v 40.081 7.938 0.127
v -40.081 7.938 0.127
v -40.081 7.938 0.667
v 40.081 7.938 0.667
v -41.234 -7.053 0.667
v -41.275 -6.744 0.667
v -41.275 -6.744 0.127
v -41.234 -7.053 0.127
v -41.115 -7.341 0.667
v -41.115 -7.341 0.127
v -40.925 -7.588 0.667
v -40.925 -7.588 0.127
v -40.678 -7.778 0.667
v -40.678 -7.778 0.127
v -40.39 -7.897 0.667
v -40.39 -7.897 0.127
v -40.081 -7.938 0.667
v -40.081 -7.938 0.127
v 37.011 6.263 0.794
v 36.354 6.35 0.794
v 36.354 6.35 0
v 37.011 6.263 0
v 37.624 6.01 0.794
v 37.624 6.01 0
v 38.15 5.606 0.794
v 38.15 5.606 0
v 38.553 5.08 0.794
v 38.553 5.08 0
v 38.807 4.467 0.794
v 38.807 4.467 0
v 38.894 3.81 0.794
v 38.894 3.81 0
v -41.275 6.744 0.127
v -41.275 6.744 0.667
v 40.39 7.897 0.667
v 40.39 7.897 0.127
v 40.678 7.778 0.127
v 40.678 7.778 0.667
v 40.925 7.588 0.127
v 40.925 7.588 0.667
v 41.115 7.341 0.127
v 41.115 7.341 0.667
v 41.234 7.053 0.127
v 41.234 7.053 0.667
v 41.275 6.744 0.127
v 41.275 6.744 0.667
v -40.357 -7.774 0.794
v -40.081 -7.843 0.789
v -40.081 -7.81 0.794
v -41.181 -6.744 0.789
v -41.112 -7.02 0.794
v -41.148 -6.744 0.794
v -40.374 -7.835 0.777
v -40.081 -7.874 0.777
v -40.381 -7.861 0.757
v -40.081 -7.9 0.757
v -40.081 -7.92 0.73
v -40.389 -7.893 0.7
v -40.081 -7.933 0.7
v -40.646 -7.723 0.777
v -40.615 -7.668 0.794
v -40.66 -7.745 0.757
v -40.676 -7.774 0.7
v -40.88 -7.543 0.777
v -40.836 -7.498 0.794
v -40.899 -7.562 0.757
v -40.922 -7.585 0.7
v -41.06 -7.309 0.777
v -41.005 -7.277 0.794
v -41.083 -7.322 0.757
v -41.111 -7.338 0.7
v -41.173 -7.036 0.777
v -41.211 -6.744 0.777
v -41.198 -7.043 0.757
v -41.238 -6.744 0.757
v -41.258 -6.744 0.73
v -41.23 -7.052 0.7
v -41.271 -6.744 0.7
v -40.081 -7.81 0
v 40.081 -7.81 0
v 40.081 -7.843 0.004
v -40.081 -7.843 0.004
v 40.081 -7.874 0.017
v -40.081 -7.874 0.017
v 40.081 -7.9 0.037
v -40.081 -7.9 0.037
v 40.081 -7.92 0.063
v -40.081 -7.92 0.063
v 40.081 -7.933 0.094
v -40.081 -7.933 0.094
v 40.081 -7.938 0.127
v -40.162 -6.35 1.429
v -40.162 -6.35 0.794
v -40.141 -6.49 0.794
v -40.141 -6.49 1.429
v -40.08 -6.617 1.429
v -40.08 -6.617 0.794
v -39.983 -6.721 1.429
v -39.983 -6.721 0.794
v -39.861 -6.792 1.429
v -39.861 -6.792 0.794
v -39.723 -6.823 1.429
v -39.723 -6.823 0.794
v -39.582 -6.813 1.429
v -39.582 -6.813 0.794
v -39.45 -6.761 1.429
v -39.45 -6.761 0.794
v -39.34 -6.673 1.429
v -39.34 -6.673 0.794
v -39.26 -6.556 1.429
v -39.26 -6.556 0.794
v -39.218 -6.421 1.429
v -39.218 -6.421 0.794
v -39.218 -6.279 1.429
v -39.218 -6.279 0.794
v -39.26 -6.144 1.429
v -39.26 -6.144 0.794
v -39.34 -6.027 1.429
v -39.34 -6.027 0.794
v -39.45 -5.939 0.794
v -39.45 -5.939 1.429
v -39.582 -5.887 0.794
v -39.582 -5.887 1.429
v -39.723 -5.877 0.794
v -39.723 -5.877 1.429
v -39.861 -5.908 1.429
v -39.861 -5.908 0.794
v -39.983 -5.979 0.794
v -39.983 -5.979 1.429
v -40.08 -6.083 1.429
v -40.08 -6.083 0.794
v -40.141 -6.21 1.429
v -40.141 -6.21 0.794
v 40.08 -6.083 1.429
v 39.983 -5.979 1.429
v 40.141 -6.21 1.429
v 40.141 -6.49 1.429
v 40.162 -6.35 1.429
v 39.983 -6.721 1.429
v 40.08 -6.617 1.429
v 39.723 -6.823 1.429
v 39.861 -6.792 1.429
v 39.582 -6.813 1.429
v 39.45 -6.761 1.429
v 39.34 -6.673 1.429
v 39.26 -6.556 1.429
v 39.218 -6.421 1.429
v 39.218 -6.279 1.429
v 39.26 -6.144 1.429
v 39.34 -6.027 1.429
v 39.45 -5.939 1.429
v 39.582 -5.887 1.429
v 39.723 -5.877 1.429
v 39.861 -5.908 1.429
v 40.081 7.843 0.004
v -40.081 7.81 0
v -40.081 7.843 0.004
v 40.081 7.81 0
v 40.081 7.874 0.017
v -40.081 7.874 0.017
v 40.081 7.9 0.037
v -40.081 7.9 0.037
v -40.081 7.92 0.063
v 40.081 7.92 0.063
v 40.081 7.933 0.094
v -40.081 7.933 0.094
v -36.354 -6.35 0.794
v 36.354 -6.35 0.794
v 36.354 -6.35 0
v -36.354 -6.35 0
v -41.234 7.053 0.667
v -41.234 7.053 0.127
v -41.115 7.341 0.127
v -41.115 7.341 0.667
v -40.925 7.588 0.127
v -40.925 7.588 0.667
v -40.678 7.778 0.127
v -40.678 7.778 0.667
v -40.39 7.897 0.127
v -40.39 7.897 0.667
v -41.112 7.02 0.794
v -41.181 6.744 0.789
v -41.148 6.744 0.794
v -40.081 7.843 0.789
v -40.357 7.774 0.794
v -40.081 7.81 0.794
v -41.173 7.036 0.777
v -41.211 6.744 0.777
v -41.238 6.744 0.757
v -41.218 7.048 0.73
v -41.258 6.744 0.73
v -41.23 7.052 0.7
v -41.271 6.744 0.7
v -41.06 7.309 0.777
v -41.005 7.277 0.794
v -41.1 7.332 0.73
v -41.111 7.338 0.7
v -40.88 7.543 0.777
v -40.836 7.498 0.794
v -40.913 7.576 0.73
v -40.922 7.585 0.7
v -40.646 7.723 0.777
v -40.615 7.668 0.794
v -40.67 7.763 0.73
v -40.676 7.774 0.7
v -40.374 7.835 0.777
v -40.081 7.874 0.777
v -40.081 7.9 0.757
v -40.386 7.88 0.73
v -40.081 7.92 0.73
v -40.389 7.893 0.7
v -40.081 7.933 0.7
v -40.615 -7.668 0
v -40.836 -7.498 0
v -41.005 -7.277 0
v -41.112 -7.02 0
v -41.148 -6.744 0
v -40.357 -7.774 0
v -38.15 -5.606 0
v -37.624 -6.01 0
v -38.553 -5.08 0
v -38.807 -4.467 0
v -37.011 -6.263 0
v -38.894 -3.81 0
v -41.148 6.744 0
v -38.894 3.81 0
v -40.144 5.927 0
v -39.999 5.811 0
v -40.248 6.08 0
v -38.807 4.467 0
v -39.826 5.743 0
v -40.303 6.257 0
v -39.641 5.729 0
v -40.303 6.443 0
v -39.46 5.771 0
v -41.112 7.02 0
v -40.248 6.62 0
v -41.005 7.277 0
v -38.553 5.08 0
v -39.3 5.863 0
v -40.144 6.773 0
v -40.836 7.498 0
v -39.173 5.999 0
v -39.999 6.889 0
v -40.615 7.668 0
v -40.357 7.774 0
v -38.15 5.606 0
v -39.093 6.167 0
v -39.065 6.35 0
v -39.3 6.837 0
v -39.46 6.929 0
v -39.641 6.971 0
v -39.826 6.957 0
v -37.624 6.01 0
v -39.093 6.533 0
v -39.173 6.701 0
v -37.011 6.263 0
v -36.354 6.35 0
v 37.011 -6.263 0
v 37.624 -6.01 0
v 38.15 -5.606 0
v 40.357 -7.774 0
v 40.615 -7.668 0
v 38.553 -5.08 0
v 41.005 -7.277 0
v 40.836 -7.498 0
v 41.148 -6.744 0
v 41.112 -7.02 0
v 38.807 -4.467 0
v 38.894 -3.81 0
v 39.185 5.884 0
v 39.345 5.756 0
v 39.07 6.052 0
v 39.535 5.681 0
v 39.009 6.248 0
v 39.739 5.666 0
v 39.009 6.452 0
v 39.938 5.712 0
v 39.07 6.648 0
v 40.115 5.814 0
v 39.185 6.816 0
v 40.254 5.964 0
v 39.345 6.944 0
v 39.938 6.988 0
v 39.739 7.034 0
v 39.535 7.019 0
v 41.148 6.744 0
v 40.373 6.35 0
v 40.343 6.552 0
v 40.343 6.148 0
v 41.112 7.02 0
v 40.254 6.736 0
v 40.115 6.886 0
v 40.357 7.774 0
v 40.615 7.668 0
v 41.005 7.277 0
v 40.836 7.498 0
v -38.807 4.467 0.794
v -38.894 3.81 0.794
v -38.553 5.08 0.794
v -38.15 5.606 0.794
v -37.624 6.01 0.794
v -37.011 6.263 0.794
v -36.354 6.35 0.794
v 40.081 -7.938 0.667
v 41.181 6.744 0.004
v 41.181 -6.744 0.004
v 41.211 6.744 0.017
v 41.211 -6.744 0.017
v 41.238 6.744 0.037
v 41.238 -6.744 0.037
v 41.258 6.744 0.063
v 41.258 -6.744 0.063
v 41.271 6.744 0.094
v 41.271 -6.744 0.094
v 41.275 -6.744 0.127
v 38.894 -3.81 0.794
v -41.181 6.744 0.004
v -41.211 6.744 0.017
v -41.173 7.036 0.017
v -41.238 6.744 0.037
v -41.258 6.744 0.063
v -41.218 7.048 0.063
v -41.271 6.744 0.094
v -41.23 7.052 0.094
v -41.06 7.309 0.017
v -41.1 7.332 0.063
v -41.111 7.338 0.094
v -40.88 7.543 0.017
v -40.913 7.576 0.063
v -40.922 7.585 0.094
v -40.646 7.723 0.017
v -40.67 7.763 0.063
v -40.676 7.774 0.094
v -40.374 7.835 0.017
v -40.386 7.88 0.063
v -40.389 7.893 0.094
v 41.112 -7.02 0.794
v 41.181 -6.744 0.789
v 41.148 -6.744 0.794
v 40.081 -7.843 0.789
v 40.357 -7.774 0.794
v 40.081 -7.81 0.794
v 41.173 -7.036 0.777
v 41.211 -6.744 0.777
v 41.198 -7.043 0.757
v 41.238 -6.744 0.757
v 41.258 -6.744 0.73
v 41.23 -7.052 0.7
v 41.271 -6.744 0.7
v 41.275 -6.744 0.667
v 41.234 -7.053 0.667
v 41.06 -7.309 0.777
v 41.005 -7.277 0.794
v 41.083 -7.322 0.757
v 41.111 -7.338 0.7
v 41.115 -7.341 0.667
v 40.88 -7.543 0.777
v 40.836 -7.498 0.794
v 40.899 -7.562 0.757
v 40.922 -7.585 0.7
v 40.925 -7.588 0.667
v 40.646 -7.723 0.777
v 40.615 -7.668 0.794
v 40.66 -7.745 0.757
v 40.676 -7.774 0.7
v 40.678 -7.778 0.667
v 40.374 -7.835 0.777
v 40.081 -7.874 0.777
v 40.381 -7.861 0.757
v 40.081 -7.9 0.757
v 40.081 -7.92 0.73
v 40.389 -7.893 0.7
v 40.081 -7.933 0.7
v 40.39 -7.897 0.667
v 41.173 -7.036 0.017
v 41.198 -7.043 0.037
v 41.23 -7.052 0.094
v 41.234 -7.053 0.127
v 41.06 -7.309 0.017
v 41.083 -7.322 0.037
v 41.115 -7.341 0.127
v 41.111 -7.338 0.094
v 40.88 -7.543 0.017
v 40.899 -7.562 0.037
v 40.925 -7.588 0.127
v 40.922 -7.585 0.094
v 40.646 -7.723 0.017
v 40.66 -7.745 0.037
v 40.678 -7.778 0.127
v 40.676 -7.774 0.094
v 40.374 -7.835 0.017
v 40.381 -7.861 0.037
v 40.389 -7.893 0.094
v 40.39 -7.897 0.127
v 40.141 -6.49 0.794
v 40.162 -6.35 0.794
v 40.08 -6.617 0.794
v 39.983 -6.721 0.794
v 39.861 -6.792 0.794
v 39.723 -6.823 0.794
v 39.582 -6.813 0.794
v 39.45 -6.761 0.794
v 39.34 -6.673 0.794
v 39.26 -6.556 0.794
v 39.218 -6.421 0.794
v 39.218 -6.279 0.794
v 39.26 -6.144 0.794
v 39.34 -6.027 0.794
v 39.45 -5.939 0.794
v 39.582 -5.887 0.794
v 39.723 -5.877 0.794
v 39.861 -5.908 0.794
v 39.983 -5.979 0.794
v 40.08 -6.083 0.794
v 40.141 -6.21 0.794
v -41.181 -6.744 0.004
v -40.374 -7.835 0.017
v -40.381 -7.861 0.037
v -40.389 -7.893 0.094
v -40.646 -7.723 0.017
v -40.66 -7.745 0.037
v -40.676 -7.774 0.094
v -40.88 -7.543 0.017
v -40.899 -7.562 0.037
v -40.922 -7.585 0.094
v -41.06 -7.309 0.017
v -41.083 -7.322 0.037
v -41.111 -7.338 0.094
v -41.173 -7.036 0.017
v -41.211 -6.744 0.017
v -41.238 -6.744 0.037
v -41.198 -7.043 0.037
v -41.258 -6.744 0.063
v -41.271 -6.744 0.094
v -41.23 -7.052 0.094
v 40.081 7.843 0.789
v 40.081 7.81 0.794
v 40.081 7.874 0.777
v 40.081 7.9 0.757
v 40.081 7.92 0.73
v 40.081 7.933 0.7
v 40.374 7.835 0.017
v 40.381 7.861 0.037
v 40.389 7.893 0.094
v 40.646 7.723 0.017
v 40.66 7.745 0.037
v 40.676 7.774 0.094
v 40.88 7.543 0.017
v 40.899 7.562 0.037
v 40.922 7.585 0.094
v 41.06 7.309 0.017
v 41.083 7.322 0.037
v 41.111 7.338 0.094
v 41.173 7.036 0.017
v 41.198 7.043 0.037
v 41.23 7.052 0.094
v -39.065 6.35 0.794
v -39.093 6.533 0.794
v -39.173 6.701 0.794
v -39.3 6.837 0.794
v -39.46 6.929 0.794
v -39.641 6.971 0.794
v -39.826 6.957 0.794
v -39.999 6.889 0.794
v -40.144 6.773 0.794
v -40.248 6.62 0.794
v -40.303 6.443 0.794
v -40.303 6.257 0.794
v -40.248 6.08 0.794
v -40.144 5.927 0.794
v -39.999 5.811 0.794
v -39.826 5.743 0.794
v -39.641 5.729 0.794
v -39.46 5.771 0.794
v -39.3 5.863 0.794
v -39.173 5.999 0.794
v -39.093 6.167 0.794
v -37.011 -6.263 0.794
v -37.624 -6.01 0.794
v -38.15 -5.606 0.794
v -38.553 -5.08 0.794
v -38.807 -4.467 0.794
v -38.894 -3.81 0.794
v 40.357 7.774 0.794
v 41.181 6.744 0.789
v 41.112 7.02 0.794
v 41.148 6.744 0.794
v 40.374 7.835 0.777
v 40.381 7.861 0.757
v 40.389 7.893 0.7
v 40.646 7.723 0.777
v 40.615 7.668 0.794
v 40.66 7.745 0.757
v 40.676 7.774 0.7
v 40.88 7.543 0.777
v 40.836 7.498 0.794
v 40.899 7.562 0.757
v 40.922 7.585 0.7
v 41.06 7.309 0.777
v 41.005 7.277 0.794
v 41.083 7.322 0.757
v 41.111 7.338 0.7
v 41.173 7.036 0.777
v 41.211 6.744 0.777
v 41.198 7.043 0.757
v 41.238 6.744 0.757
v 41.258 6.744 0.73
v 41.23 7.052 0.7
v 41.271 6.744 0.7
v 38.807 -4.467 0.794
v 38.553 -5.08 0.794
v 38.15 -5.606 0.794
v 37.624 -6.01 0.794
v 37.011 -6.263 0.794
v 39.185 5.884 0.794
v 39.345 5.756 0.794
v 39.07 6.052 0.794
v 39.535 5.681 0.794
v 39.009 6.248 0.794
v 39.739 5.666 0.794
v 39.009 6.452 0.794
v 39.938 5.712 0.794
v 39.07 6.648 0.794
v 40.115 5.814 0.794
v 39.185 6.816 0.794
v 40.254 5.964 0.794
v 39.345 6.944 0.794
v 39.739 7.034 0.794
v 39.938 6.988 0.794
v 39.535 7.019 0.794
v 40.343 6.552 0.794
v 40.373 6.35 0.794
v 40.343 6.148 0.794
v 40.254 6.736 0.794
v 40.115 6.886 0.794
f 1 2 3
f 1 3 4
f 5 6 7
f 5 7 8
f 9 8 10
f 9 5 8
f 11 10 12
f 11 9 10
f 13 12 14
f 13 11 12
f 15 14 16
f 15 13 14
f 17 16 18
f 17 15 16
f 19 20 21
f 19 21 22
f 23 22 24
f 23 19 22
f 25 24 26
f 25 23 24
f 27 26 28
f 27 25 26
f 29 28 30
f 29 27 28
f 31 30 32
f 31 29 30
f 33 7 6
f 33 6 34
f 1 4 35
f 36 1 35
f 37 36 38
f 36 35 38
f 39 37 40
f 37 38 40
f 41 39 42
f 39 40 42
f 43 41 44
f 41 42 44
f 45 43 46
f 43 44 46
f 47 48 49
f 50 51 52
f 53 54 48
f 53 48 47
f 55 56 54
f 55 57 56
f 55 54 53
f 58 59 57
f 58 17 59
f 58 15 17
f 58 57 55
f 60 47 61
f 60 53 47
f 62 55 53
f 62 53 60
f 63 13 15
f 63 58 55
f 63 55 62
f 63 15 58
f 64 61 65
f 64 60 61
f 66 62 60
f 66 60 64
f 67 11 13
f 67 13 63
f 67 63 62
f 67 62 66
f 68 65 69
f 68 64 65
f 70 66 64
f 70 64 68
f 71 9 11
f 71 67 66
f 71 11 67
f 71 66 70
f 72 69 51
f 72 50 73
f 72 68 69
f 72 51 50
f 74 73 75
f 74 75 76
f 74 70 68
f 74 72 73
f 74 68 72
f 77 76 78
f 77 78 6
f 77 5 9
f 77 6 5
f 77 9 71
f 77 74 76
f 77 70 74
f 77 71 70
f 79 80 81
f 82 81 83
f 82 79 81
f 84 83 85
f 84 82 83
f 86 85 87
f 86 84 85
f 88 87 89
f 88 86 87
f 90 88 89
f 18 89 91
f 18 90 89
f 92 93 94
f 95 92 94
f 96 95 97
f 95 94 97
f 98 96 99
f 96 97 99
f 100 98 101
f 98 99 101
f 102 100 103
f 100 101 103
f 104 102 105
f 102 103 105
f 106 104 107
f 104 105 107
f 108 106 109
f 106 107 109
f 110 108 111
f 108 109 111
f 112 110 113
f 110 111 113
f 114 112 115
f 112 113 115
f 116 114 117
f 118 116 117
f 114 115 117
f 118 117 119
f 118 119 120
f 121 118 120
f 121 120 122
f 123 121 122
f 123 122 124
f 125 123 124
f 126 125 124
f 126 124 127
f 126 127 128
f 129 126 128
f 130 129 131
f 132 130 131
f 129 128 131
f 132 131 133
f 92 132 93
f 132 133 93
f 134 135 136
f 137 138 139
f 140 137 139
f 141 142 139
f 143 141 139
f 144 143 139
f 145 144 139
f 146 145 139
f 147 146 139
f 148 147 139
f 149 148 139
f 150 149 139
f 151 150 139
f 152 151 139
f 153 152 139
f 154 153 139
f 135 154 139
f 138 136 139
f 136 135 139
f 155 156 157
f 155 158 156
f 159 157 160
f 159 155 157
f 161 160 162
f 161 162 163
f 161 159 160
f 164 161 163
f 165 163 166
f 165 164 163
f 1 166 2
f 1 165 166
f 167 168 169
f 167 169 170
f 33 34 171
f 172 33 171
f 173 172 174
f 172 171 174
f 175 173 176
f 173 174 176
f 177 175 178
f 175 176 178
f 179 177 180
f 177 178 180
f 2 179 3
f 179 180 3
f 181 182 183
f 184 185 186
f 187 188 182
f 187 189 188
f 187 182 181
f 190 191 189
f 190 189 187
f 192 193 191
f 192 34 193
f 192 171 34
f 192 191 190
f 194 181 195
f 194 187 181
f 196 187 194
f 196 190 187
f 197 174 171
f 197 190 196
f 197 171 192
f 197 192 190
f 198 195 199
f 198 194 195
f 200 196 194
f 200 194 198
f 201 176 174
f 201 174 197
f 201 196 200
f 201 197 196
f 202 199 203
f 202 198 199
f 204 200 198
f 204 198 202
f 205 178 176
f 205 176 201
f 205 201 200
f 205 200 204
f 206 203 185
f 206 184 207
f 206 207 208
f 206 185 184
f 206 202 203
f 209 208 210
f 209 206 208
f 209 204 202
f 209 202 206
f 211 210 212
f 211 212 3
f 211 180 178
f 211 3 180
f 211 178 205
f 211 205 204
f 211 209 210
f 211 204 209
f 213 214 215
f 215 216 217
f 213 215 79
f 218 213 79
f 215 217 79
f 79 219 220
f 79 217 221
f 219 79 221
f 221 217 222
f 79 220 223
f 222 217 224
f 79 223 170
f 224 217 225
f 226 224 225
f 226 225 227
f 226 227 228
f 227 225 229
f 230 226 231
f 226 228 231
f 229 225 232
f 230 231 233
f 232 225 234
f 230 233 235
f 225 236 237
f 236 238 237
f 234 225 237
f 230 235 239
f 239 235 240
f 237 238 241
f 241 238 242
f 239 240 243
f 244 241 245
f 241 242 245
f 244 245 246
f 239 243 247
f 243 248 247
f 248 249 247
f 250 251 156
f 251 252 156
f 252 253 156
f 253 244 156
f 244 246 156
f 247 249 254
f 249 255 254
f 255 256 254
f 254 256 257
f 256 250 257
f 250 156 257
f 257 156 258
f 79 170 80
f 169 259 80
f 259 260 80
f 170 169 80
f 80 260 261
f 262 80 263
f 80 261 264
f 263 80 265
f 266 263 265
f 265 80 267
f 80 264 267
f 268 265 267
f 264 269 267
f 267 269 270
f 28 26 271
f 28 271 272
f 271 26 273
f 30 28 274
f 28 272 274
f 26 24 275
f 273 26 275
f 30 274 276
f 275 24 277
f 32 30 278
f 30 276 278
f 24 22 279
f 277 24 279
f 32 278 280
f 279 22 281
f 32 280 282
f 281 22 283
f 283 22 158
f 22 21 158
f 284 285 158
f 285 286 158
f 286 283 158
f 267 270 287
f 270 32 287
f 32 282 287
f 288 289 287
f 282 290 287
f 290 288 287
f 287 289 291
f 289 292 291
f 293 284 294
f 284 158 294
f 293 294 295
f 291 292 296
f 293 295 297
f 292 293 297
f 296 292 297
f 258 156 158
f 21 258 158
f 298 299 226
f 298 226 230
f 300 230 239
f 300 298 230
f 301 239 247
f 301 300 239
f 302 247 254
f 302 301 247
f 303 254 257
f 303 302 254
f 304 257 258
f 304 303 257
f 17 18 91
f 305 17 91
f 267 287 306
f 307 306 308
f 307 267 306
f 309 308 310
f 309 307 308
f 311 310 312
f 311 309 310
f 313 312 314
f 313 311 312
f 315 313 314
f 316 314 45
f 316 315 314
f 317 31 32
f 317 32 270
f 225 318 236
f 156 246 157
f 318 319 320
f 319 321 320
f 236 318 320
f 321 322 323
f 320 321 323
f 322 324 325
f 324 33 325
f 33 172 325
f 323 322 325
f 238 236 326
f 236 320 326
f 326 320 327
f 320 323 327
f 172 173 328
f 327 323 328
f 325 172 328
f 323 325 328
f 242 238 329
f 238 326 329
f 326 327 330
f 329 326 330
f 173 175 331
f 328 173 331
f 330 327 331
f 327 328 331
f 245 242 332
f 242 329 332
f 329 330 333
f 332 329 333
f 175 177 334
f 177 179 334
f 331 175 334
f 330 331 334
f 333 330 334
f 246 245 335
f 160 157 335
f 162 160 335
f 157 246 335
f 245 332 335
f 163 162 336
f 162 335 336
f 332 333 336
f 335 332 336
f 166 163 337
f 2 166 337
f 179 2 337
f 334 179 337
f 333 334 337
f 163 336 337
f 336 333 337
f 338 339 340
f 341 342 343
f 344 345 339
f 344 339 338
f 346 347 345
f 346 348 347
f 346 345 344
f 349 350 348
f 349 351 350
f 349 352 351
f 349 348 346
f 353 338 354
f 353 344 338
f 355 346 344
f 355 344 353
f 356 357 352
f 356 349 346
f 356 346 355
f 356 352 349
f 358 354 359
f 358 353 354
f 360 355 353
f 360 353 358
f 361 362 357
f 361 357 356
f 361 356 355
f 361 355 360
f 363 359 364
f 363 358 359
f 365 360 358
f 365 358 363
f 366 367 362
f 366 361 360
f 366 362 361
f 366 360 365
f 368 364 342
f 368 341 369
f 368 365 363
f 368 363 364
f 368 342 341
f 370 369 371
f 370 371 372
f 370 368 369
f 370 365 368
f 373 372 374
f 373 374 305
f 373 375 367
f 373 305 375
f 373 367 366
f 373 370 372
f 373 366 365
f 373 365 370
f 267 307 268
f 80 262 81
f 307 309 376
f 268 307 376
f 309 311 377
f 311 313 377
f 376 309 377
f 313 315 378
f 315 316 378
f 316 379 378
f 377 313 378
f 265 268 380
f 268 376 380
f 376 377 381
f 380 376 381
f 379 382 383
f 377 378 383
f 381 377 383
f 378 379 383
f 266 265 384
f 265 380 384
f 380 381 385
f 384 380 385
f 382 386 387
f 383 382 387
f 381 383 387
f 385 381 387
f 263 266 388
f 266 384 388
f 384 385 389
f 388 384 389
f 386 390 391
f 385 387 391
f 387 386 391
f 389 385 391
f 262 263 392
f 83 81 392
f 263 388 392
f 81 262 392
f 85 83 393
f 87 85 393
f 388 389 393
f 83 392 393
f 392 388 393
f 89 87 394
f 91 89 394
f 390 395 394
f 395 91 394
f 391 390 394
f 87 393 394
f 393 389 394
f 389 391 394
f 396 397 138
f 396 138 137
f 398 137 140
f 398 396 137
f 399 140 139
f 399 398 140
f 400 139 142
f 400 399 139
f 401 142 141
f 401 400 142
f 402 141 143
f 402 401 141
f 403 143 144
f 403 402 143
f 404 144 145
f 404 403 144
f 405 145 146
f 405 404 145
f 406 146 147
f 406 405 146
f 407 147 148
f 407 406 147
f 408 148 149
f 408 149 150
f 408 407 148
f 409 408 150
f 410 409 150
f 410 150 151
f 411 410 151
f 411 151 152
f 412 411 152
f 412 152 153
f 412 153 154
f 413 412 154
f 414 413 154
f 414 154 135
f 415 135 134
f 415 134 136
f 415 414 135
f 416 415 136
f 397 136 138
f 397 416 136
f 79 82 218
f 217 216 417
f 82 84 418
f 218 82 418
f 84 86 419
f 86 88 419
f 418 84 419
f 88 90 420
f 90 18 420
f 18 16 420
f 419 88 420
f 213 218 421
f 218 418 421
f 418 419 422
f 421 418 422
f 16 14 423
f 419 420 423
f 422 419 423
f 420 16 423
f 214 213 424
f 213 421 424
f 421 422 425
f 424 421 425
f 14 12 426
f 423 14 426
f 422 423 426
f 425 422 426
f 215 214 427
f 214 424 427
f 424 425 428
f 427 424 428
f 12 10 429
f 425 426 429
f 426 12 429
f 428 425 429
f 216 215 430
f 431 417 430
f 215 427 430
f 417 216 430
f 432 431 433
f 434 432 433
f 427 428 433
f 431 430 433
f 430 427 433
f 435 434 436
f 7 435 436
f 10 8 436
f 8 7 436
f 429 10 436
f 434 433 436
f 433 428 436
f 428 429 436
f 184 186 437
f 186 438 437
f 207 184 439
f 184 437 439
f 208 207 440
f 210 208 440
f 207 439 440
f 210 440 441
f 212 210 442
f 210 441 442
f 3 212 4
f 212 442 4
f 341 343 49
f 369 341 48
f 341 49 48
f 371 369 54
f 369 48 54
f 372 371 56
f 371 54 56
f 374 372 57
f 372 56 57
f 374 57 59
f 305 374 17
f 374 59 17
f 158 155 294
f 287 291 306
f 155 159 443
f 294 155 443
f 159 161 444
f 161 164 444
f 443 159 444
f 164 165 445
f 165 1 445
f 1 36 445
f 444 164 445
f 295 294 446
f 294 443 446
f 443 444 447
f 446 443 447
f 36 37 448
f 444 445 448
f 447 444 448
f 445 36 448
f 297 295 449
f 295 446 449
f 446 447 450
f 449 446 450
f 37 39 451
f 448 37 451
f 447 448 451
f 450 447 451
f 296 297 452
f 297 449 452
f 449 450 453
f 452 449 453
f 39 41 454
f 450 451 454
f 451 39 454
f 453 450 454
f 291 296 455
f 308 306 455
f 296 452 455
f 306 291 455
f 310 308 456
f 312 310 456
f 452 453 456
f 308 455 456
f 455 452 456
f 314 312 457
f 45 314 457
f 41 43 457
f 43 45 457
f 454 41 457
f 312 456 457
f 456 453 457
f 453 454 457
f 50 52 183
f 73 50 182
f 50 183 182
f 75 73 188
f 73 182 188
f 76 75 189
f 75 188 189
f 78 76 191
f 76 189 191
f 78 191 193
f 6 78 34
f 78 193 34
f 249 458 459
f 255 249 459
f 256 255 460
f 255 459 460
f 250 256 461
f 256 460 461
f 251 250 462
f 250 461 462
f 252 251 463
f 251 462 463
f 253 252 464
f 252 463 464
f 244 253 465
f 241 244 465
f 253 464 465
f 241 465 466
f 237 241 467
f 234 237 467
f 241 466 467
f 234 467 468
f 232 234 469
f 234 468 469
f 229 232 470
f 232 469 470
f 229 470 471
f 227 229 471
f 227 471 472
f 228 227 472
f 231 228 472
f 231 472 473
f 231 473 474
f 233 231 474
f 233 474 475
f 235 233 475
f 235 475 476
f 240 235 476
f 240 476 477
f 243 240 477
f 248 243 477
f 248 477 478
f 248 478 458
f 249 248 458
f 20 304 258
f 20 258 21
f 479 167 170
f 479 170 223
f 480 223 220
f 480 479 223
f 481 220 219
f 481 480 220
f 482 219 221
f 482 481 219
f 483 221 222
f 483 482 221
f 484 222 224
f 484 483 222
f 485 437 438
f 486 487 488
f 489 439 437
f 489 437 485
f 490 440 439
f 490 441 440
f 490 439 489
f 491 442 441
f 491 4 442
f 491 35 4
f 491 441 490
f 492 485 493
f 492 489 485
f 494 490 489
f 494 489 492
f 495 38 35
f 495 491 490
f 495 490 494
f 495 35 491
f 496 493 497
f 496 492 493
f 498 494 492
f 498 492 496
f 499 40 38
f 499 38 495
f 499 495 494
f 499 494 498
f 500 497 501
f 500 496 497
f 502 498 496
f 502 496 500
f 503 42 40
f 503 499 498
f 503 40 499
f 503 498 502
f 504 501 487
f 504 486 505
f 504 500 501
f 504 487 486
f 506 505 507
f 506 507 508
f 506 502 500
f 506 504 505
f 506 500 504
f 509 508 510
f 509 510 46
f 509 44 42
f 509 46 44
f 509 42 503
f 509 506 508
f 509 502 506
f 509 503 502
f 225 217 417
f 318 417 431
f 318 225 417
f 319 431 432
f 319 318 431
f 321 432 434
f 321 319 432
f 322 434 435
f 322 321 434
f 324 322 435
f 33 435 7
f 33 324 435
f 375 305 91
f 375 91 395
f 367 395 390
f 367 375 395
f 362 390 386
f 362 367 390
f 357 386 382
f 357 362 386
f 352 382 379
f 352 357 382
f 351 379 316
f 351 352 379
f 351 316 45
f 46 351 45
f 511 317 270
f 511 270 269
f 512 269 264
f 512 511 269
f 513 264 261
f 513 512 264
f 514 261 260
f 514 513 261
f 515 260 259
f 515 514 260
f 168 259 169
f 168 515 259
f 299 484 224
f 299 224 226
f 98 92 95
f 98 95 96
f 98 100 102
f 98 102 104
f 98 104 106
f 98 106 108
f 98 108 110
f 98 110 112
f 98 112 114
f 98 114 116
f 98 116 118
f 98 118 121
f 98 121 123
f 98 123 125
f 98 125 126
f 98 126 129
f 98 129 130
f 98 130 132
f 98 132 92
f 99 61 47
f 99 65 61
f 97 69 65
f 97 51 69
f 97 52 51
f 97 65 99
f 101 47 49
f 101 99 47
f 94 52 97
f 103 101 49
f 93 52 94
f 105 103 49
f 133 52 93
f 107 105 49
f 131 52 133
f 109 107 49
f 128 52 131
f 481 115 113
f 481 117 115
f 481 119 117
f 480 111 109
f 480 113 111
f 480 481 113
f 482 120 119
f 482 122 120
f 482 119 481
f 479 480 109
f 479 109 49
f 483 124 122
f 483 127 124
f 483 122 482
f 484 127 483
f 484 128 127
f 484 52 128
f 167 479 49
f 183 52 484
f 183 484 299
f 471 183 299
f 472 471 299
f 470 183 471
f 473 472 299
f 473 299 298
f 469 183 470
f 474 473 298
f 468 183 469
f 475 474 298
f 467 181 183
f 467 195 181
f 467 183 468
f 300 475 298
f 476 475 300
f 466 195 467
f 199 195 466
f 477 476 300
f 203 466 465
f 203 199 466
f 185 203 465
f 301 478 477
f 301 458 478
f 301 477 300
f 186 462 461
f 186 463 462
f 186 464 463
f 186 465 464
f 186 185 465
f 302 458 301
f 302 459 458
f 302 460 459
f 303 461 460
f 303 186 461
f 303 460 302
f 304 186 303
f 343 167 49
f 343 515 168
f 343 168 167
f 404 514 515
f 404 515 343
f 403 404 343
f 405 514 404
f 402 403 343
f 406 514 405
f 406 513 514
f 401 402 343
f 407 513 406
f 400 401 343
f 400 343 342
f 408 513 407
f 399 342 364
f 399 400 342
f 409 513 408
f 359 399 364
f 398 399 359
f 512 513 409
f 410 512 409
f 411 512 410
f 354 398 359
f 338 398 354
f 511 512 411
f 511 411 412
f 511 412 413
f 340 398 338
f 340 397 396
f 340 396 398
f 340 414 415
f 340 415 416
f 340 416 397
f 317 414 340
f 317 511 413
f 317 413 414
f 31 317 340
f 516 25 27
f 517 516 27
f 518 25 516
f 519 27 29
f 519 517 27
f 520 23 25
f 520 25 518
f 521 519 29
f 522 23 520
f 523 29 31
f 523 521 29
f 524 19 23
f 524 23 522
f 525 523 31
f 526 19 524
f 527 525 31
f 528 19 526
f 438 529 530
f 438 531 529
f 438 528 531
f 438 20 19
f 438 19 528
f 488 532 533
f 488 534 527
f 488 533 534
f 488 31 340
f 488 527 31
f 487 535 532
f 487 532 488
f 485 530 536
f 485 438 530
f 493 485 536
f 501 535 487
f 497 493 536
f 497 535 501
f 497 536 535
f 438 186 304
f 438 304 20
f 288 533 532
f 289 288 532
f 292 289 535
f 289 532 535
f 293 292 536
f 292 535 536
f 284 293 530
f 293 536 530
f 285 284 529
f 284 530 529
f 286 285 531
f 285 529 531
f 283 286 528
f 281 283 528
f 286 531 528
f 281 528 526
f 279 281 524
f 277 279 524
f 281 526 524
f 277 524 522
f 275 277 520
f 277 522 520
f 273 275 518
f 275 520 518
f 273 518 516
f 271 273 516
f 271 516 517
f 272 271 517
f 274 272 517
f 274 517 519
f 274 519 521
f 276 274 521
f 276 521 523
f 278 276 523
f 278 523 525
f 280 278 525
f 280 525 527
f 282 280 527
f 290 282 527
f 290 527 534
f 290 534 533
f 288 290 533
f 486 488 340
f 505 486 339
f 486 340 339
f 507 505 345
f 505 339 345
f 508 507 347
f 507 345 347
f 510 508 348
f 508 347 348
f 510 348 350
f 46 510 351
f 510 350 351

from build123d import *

# Parameters (mm, degrees)
SKETCH1_W               = 82.55
SKETCH1_H               = 15.875
BOSS_EXTRUDE1_DEPTH     = 0.79375
SKETCH4_R               = 0.474599
BOSS_EXTRUDE2_DEPTH     = 0.635
MIRROR2_COPY_1_SKETCH_R = 0.474599
MIRROR2_COPY_1_DEPTH    = 0.635
CUT_EXTRUDE3_DEPTH      = 43.038786499
SKETCH7_R               = 0.6223
SKETCH7_R_2             = 0.6858
CUT_EXTRUDE4_DEPTH      = 43.05556869
FILLET1_R               = 1.1938
FILLET2_R               = 0.127


with BuildPart() as part:
    # Sketch1 → Boss-Extrude1 (new body)
    with BuildSketch(Plane.XY):
        Rectangle(SKETCH1_W, SKETCH1_H)
    extrude(amount=BOSS_EXTRUDE1_DEPTH)

    # Sketch4 → Boss-Extrude2 (add)
    with BuildSketch(Plane.XY.offset(0.79375)):
        with Locations((39.6875, 6.35)):
            Circle(SKETCH4_R)
    boss_extrude2 = extrude(amount=BOSS_EXTRUDE2_DEPTH)

    # Mirror1: Boss-Extrude2 across plane
    add(boss_extrude2.mirror(Plane.ZX))

    # Mirror2: Boss-Extrude2 across plane
    add(boss_extrude2.mirror(Plane(origin=(0, 0, 0), x_dir=(0, 0, 1), z_dir=(1, 0, 0))))

    # Mirror2 copy 1 sketch → Mirror2 copy 1 (add)
    with BuildSketch(Plane(origin=(0, 0, 0.79375), x_dir=(-1, 0, 0), z_dir=(0, 0, 1))):
        with Locations((39.6875, 6.35)):
            Circle(MIRROR2_COPY_1_SKETCH_R)
    extrude(amount=MIRROR2_COPY_1_DEPTH)

    # Sketch6 → Cut-Extrude3 (cut, through all)
    with BuildSketch(Plane.XY.offset(0.79375)):
        with BuildLine():
            Line((-36.35375, 6.35), (36.35375, 6.35))
            ThreePointArc((36.35375, 6.35), (38.149801224, 5.606051224), (38.89375, 3.81))
            Line((38.89375, 3.81), (38.89375, -3.81))
            ThreePointArc((38.89375, -3.81), (38.149801224, -5.606051224), (36.35375, -6.35))
            Line((36.35375, -6.35), (-36.35375, -6.35))
            ThreePointArc((-36.35375, -6.35), (-38.149801224, -5.606051224), (-38.89375, -3.81))
            Line((-38.89375, -3.81), (-38.89375, 3.81))
            ThreePointArc((-38.89375, 3.81), (-38.149801224, 5.606051224), (-36.35375, 6.35))
        make_face()
    extrude(amount=-CUT_EXTRUDE3_DEPTH, mode=Mode.SUBTRACT)

    # Sketch7 → Cut-Extrude4 (cut, through all)
    with BuildSketch(Plane.XY.offset(1.42875)):
        with Locations((-39.6875, 6.35)):
            Circle(SKETCH7_R)
        with Locations((39.6875, 6.35)):
            Circle(SKETCH7_R_2)
    extrude(amount=-CUT_EXTRUDE4_DEPTH, mode=Mode.SUBTRACT)

    # Fillet1
    fillet1_edges = [part.edges().sort_by_distance(p)[0] for p in [
        (41.275, -7.9375, 0.396875),
        (-41.275, -7.9375, 0.396875),
        (-41.275, 7.9375, 0.396875),
        (41.275, 7.9375, 0.396875),
    ]]
    fillet(fillet1_edges, radius=FILLET1_R)

    # Fillet2
    fillet2_edges = [part.edges().sort_by_distance(p)[0] for p in [
        (0, 7.9375, 0),
        (0, 7.9375, 0.79375),
        (41.275, 0, 0),
        (0, -7.9375, 0),
        (-41.275, 0, 0),
        (-40.925344075, 7.587844075, 0),
        (-40.925344075, -7.587844075, 0),
        (40.925344075, -7.587844075, 0),
        (40.925344075, 7.587844075, 0),
        (41.275, 0, 0.79375),
        (-41.275, 0, 0.79375),
        (0, -7.9375, 0.79375),
        (-40.925344075, 7.587844075, 0.79375),
        (-40.925344075, -7.587844075, 0.79375),
        (40.925344075, -7.587844075, 0.79375),
        (40.925344075, 7.587844075, 0.79375),
    ]]
    fillet(fillet2_edges, radius=FILLET2_R)


solid = part.part
